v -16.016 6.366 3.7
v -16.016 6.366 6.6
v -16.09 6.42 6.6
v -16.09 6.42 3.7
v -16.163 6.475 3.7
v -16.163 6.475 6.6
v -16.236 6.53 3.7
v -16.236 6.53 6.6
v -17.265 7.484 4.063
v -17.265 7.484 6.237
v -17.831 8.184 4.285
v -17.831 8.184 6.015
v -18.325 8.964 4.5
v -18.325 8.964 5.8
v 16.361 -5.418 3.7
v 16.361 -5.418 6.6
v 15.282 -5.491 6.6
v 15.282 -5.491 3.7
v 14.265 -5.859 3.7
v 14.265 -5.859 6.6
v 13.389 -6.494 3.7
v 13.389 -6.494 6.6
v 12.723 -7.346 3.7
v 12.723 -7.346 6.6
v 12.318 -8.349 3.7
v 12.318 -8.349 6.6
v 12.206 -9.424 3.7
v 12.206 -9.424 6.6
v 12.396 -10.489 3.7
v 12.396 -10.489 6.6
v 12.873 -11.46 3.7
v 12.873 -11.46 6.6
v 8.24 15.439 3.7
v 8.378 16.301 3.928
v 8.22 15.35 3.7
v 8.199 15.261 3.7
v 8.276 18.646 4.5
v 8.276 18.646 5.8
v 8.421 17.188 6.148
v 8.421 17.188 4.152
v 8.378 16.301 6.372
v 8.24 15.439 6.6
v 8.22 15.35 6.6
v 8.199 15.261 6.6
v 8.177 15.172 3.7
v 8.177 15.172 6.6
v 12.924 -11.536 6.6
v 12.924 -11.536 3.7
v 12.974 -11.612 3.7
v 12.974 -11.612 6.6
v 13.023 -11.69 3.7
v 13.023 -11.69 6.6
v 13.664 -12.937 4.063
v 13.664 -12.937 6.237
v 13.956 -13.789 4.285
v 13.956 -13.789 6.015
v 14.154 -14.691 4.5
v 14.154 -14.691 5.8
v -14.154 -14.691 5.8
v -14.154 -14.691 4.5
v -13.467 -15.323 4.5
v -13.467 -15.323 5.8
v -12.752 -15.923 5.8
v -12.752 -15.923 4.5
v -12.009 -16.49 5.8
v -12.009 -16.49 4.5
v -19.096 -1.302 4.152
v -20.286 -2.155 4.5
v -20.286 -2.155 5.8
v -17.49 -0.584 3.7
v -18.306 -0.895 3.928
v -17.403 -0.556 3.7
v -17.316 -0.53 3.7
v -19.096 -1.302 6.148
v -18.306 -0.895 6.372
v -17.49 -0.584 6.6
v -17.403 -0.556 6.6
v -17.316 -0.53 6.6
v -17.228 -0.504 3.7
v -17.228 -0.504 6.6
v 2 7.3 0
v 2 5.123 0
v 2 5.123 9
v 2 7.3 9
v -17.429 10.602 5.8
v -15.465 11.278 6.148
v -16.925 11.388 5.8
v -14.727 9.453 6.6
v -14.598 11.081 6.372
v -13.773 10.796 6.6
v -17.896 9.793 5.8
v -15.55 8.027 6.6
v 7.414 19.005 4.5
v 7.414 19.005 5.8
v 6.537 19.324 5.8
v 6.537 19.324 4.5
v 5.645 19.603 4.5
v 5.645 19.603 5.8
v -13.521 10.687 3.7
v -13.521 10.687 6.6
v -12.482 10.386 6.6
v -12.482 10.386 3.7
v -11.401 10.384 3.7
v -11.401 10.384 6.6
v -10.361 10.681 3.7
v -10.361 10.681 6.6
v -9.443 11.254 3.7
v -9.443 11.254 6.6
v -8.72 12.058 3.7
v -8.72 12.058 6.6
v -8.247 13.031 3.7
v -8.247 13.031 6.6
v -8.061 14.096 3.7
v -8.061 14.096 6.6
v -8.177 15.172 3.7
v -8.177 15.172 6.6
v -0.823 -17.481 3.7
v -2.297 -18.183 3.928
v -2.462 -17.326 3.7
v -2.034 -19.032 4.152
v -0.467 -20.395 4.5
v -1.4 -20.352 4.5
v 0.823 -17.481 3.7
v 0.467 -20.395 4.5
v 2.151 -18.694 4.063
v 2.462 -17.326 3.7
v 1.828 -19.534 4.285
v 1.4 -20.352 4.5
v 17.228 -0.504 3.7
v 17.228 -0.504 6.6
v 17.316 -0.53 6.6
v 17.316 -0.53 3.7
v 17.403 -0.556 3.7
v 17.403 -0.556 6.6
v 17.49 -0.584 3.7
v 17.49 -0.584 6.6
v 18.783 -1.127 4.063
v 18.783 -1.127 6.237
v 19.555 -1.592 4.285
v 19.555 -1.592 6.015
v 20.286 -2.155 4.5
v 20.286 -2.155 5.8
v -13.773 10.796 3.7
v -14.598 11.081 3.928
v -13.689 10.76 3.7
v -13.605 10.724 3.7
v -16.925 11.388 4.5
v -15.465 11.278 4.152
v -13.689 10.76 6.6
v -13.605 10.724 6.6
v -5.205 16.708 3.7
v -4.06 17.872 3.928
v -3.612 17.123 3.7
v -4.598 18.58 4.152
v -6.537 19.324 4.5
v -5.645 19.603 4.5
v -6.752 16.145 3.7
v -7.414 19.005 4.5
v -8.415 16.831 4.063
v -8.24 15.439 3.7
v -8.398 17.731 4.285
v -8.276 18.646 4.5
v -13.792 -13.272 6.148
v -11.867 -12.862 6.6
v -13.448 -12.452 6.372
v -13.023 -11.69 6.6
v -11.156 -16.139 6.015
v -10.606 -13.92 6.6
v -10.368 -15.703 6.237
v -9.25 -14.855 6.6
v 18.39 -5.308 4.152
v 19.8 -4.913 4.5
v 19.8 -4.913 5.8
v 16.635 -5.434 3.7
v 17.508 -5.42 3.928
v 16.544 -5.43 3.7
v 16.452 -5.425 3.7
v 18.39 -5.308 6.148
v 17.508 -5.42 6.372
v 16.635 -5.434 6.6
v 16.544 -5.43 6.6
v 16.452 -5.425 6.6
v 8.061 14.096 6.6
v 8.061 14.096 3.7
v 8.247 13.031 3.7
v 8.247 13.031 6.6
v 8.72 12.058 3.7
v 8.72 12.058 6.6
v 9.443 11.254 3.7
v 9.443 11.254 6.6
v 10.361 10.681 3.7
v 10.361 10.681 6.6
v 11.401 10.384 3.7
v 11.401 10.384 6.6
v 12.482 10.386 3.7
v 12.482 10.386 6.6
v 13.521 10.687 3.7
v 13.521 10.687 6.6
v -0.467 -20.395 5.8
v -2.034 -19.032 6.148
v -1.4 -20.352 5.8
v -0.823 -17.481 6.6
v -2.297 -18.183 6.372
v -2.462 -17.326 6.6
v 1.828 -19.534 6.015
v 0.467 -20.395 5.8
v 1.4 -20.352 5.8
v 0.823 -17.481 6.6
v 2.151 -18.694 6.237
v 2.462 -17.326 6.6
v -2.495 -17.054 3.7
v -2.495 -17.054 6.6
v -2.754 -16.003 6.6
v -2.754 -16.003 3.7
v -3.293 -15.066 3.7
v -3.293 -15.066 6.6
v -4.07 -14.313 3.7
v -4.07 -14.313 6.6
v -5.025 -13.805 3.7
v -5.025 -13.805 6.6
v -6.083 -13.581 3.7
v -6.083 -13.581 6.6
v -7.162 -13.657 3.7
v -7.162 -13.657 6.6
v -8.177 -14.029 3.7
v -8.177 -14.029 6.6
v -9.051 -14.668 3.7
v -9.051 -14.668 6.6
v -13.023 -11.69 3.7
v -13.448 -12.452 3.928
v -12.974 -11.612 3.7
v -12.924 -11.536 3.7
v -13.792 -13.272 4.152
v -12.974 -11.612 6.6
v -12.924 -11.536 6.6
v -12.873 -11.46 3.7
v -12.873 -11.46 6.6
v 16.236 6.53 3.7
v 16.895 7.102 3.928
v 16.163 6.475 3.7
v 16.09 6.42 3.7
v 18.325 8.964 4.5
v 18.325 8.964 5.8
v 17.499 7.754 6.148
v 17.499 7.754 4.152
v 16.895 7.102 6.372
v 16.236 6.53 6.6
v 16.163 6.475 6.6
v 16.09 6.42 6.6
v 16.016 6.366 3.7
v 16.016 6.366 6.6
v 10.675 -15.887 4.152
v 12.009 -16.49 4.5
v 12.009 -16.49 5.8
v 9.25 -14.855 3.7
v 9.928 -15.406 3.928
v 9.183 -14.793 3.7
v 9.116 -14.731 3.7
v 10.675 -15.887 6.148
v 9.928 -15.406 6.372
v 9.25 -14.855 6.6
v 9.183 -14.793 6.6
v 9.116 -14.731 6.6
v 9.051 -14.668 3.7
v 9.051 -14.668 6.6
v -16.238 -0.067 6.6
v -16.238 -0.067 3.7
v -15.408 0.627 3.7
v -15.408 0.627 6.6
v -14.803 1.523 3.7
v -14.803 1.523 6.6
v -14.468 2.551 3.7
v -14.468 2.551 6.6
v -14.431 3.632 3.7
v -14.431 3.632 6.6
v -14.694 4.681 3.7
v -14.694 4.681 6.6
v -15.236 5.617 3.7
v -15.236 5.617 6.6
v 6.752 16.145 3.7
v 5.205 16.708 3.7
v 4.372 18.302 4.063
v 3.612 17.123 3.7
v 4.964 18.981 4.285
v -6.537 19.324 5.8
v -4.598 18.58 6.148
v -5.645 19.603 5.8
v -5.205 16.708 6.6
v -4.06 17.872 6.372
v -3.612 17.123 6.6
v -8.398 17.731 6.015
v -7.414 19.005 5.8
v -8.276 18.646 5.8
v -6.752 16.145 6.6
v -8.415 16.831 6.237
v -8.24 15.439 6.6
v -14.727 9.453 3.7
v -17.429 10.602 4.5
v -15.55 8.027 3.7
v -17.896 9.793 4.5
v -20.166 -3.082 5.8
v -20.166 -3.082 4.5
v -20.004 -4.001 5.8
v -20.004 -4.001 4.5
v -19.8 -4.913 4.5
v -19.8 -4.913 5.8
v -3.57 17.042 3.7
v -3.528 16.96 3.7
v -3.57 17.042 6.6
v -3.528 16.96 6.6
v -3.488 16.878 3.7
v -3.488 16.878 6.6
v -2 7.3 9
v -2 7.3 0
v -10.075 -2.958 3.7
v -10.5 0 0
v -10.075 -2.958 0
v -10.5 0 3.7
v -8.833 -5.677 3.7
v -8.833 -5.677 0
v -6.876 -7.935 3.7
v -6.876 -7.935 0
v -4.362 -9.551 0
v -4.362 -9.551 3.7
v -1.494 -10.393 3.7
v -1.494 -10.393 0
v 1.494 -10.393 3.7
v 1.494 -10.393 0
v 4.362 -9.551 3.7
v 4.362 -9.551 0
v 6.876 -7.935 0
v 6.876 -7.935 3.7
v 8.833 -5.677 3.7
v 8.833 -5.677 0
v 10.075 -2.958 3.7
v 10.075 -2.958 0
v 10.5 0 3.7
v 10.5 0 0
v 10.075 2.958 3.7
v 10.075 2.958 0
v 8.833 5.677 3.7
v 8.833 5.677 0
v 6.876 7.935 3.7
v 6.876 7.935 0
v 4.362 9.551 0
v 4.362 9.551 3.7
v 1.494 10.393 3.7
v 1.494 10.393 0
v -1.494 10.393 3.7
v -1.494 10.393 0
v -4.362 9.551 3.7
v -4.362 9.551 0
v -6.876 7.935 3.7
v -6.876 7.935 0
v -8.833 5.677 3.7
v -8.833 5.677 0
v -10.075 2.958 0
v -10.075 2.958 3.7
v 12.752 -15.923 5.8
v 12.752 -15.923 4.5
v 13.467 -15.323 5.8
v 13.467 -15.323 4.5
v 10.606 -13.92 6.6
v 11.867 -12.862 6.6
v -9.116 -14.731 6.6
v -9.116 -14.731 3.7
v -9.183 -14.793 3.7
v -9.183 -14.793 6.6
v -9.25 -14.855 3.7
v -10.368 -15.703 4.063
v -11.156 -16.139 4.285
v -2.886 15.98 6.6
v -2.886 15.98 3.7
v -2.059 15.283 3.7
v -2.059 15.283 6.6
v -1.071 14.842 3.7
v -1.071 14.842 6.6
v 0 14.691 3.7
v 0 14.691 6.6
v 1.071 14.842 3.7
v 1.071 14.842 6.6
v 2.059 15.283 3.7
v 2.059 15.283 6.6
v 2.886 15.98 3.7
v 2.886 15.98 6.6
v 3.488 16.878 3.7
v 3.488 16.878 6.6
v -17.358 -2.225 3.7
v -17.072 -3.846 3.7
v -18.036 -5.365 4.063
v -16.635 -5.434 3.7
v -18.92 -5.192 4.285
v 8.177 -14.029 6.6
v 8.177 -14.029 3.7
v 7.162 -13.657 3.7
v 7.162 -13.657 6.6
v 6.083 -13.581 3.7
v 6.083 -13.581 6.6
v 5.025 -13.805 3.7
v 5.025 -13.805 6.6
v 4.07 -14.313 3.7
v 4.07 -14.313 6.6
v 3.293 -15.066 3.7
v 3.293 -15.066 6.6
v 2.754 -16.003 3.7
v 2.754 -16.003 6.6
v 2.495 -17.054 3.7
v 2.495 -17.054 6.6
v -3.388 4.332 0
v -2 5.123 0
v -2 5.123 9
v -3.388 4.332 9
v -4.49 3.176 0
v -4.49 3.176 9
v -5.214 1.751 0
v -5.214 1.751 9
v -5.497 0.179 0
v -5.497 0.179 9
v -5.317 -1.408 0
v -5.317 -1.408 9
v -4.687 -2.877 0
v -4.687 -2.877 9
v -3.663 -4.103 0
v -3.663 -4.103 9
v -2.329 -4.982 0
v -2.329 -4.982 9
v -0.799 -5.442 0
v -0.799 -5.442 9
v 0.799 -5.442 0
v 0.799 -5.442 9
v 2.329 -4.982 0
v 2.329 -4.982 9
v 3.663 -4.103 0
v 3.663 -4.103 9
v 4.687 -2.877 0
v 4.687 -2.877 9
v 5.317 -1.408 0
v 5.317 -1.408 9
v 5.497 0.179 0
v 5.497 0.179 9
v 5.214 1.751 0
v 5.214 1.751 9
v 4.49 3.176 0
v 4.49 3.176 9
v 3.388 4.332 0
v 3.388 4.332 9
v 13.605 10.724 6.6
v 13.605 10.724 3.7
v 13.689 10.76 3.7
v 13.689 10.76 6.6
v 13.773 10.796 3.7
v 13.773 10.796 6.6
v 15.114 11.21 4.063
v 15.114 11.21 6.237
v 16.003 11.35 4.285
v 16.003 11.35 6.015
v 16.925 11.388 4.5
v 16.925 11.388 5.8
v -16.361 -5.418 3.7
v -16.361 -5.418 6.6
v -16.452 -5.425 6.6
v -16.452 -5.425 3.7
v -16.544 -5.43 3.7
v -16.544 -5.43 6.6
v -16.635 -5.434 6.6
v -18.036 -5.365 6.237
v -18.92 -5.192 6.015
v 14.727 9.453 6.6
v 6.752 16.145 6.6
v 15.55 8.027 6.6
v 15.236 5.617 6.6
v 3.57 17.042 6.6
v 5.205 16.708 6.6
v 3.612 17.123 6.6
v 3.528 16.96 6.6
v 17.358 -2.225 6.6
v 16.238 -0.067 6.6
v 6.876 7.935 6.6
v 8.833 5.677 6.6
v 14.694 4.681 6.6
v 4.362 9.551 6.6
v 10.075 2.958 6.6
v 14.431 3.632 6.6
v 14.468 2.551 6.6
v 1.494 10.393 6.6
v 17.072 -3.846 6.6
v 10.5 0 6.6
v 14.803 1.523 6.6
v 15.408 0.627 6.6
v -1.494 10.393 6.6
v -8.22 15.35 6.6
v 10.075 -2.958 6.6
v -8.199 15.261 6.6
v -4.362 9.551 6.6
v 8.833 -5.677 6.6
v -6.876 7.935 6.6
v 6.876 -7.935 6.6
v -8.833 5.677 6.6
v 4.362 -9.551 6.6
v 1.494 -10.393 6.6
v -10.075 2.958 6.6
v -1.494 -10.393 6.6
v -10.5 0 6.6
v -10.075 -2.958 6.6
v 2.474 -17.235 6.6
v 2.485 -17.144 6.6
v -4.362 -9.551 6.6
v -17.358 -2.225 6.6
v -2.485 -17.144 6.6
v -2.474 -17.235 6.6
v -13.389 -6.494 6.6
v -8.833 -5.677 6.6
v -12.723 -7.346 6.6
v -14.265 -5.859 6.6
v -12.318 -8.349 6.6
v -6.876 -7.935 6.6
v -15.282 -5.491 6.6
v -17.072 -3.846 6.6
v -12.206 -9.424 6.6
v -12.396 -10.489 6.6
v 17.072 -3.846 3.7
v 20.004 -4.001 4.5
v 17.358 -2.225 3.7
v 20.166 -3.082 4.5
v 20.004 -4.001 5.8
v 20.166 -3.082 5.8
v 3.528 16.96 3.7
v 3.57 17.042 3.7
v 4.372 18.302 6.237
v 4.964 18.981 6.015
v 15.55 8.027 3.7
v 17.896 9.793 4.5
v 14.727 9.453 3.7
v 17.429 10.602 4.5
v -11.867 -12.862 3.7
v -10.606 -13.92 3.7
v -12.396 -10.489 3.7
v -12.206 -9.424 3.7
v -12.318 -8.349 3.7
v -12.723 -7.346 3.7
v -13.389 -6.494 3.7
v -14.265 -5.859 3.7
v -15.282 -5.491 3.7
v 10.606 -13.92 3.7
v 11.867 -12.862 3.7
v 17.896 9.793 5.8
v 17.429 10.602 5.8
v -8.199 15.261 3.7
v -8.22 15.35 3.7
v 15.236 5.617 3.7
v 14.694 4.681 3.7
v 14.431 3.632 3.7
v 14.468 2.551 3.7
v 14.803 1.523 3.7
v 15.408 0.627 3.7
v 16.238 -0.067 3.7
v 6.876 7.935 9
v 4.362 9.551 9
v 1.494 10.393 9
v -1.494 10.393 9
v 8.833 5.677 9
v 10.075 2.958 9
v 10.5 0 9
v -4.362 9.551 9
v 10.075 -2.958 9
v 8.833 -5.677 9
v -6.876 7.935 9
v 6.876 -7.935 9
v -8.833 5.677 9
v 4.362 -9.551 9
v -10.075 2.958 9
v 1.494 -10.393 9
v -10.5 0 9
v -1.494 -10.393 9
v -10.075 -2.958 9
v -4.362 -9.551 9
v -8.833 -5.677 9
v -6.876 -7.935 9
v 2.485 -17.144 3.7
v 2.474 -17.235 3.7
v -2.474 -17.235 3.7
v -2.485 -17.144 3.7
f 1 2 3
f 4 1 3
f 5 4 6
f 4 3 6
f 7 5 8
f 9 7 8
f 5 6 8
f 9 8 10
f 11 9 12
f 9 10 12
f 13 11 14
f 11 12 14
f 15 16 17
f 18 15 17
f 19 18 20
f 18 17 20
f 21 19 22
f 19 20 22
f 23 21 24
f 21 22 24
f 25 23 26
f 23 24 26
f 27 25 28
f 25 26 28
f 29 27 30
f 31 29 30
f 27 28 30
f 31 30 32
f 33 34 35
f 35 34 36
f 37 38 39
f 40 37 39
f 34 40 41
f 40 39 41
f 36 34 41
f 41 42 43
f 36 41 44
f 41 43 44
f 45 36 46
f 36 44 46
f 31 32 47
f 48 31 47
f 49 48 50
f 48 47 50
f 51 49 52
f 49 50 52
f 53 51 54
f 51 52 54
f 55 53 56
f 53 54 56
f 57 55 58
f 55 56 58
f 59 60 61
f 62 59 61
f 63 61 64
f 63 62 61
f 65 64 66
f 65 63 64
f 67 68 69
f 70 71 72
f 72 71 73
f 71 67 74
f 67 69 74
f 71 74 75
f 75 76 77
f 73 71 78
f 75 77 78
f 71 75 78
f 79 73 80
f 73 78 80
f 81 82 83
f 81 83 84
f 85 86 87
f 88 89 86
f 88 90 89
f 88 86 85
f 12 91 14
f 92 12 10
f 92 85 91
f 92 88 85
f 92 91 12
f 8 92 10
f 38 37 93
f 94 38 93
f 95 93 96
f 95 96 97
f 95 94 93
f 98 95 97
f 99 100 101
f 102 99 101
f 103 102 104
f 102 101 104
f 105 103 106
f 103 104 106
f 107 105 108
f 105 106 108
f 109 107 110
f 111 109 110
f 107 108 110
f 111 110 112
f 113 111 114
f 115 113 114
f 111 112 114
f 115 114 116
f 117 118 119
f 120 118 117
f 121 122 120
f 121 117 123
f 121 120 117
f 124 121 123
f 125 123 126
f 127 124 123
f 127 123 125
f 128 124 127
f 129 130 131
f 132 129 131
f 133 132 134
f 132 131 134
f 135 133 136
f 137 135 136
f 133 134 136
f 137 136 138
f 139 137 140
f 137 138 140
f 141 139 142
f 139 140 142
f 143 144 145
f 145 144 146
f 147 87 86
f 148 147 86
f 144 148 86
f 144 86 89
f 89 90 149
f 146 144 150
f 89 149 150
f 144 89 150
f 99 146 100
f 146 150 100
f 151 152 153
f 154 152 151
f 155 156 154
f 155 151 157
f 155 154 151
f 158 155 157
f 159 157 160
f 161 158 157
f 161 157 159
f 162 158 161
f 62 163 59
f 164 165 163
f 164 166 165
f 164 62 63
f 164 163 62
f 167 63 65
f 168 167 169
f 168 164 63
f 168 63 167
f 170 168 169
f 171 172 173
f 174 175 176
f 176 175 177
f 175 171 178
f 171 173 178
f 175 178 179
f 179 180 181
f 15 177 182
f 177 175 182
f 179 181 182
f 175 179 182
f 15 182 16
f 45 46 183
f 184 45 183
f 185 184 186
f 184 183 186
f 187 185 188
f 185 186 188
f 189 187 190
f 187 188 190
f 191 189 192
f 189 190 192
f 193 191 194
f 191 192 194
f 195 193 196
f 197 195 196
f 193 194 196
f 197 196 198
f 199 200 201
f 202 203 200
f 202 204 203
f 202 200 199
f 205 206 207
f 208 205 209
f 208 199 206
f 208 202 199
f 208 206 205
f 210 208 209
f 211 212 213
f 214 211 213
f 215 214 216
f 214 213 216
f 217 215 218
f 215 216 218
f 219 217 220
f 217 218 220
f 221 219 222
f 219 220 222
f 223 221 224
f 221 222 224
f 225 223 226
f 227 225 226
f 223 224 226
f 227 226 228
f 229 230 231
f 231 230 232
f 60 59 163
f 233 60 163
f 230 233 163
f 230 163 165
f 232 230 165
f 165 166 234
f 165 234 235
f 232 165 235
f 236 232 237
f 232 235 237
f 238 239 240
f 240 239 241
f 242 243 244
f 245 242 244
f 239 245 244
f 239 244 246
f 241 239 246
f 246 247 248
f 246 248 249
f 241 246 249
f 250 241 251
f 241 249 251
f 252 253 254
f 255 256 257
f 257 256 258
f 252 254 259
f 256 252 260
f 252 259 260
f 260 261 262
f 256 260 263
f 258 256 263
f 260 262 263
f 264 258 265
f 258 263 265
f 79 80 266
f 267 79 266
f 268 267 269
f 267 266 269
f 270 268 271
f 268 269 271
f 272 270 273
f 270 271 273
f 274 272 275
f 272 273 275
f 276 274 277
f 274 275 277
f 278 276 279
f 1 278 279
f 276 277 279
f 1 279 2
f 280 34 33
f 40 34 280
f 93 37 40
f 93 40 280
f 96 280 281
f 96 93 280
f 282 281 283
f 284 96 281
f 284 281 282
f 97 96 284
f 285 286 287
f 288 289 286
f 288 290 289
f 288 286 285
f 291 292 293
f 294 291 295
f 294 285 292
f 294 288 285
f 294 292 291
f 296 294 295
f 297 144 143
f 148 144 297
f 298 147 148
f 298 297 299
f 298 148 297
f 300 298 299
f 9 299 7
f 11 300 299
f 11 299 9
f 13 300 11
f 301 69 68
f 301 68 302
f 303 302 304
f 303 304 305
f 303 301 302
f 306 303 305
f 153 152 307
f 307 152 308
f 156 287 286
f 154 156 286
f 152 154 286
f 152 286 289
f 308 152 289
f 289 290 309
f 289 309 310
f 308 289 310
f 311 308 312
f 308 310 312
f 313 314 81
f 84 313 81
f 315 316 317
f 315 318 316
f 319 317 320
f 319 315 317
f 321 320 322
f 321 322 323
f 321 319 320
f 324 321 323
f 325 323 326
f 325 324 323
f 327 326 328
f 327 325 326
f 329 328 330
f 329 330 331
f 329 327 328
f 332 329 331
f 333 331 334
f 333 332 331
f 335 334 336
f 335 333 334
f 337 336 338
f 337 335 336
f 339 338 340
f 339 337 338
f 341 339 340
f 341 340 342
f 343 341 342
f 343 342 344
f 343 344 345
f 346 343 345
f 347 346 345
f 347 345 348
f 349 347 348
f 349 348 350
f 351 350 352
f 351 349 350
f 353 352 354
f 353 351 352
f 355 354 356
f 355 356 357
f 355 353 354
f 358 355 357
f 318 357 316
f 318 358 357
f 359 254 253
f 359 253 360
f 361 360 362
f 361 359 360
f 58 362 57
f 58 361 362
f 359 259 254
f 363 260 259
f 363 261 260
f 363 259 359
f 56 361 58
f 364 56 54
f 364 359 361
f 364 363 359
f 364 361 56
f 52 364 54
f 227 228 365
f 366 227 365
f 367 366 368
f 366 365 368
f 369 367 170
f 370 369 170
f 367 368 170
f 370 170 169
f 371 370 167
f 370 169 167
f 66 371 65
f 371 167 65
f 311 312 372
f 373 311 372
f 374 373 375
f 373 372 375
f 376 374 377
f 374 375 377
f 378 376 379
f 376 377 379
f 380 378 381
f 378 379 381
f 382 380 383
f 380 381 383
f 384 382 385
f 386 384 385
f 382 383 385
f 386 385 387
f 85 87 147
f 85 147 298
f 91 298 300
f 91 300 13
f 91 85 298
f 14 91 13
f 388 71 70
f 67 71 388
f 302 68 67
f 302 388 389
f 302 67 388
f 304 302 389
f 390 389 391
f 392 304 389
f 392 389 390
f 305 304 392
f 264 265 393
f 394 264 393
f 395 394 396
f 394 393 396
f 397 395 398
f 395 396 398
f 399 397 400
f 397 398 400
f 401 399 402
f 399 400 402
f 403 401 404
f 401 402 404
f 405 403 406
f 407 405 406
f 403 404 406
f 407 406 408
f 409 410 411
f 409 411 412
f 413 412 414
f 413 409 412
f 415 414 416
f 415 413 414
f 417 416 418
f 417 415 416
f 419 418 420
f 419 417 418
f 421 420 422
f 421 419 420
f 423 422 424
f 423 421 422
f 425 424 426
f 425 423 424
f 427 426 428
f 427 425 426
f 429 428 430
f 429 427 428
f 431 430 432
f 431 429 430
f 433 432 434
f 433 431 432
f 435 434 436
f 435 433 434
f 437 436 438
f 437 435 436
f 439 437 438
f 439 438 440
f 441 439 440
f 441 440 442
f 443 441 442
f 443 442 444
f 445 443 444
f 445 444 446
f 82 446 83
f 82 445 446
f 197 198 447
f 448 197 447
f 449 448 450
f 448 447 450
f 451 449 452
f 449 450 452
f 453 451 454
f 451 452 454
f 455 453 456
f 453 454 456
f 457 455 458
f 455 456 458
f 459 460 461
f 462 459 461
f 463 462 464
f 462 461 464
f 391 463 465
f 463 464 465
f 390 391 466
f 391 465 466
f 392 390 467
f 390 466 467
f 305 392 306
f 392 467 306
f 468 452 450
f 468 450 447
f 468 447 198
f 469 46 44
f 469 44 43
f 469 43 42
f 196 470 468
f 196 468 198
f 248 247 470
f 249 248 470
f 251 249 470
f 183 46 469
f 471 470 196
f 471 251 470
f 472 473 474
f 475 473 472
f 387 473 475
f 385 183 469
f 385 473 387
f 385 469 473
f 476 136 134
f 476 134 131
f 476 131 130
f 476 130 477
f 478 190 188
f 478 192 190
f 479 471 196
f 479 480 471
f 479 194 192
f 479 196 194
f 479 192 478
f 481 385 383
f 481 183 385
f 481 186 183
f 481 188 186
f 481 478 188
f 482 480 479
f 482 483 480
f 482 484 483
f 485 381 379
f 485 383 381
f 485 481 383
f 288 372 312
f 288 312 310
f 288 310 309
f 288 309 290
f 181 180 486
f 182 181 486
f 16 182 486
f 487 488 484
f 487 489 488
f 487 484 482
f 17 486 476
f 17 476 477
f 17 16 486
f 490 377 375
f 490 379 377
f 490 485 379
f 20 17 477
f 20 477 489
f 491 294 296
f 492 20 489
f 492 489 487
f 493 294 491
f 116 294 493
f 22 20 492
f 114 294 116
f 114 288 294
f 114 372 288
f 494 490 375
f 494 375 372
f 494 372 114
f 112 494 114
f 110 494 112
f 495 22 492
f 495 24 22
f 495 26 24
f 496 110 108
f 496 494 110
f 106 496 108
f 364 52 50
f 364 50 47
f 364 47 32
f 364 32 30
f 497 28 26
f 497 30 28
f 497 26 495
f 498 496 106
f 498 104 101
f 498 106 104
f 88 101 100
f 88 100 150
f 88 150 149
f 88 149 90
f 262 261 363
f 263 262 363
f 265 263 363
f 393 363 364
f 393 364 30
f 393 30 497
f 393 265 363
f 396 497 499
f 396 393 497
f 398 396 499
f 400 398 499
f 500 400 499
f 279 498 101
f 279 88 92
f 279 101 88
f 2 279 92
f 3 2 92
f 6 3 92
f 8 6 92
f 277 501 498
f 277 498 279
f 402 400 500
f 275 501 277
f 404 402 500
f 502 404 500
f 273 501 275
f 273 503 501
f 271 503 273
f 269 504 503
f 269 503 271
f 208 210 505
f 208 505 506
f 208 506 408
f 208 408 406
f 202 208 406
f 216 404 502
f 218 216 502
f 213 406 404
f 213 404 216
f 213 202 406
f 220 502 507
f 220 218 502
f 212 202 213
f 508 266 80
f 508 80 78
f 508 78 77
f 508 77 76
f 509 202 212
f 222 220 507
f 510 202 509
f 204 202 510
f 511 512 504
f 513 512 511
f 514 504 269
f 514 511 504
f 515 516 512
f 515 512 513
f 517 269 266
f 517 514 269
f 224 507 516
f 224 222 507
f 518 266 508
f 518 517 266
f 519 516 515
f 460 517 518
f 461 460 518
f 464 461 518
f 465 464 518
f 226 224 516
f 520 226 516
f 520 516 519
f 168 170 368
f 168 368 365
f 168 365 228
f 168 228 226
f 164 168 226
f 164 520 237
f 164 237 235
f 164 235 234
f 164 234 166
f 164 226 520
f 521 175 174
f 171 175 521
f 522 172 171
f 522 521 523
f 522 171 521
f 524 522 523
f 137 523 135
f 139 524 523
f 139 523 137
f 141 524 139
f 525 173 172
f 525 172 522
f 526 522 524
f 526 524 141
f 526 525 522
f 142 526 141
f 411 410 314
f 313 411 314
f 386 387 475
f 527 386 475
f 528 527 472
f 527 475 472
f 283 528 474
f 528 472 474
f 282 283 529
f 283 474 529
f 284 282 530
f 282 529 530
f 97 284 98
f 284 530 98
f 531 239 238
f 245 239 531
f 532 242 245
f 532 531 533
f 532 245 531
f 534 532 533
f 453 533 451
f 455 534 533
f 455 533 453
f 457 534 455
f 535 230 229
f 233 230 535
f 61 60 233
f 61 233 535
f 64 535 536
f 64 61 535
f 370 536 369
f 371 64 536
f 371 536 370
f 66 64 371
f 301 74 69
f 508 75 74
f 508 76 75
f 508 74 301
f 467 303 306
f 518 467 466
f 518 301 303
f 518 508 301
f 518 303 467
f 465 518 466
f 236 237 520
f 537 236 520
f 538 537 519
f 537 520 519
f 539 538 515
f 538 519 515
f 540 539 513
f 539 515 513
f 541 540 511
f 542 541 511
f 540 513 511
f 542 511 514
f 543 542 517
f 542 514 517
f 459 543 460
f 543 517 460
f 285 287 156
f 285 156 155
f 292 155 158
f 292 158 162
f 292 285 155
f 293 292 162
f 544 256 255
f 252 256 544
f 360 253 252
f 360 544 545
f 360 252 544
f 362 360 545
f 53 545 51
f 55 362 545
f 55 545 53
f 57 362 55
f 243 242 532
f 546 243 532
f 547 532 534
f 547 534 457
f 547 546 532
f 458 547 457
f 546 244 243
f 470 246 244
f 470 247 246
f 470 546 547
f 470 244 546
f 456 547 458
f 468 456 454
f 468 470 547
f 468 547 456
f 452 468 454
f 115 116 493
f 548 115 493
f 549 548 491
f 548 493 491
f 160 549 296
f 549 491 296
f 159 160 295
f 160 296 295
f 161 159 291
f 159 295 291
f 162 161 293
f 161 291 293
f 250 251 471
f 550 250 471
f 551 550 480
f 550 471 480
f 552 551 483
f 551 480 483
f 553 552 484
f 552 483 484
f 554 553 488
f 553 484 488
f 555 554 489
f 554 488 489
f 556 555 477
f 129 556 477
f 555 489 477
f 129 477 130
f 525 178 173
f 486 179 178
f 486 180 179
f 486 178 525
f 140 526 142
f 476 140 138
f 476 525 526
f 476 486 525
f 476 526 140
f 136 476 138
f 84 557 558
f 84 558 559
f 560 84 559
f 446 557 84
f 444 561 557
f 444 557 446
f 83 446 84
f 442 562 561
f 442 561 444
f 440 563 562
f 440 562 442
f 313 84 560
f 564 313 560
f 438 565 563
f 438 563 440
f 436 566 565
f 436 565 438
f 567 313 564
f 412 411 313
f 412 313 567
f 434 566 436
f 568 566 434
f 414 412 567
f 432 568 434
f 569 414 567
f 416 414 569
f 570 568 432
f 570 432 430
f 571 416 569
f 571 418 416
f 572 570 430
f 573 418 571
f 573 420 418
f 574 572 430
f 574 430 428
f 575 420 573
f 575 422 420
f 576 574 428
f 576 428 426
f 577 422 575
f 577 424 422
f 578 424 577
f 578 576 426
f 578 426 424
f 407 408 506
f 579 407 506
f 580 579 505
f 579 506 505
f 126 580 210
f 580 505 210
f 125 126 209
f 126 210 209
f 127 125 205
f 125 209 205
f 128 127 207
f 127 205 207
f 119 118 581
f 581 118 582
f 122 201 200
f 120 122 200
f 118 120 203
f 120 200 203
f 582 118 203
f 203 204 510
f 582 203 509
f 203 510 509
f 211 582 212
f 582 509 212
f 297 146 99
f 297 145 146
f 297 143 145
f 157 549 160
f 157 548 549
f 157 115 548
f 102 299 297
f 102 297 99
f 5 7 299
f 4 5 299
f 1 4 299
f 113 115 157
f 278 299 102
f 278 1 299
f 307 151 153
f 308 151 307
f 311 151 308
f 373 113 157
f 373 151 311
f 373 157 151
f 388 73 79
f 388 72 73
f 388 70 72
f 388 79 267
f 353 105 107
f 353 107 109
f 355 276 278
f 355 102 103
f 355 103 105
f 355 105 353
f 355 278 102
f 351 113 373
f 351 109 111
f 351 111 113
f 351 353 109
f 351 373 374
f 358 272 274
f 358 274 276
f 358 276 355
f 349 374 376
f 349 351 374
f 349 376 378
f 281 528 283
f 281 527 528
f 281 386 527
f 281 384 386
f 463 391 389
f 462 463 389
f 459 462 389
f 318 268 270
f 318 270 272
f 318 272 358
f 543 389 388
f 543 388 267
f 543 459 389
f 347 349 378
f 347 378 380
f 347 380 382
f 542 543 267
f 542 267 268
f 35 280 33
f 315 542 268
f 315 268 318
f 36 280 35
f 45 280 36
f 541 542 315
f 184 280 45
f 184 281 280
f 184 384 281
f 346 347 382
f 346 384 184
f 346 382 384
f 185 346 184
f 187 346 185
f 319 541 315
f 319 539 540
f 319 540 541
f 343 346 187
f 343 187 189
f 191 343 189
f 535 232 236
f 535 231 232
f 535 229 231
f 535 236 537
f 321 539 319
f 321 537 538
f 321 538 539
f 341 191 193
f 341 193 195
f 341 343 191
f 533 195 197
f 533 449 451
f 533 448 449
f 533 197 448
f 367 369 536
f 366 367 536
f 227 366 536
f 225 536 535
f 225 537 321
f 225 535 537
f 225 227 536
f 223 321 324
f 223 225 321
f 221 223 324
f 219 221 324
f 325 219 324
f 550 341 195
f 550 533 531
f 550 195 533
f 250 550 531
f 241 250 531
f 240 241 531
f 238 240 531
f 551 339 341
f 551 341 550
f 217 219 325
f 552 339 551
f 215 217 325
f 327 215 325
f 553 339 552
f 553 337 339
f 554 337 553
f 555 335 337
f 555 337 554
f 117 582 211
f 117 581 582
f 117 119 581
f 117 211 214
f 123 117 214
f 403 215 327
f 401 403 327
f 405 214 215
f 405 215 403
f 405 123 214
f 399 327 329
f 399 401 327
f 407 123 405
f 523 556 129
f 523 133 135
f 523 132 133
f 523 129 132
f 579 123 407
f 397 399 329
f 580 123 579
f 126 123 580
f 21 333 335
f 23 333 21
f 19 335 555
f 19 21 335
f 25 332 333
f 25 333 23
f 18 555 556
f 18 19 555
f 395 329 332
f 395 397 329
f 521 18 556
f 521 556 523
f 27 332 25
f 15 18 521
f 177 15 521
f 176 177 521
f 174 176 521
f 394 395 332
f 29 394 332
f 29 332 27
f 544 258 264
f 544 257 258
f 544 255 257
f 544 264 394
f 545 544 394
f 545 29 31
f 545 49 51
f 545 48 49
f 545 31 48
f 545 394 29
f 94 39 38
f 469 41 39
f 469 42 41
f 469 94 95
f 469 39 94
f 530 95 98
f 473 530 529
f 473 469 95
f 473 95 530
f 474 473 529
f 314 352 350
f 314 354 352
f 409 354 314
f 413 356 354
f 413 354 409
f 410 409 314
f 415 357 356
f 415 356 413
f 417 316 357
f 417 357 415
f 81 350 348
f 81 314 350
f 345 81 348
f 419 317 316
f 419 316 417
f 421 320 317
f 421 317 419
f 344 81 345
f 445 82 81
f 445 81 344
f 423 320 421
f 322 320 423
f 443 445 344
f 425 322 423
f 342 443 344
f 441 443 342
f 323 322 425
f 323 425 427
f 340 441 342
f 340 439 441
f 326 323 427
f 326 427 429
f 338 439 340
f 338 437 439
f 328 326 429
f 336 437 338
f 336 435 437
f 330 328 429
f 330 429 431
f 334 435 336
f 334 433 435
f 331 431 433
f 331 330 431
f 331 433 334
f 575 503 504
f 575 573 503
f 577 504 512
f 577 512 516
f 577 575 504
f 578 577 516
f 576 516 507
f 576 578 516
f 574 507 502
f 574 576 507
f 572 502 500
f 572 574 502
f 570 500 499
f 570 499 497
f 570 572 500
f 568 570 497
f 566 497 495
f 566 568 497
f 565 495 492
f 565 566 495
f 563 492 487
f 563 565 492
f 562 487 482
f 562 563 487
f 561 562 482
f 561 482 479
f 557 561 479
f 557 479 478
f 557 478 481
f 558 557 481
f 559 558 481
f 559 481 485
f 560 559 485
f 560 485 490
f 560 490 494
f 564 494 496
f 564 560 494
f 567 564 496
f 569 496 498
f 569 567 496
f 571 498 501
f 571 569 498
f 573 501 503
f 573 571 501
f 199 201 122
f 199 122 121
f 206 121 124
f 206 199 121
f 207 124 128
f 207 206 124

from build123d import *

# Parameters (mm, degrees)
ESQUISSE2_W                  = 4
ESQUISSE2_H                  = 7.3
ENL_V_MAT_EXTRU_1_DEPTH      = 31.221184623
ENL_V_MAT_EXTRU_2_DEPTH      = 30.306014741
R_P_TITION_CIRCULAIRE1_COUNT = 9


with BuildPart() as part:
    # Esquisse1 → Révolution1 (revolve)
    with BuildSketch(Plane(origin=(0, 0, 0), x_dir=(0, 0, -1), z_dir=(1, 0, 0))):
        Polygon((-5.8, 20.4), (-6.6, 17.5), (-6.6, 10.5), (-9, 10.5), (-9, 5.5), (0, 5.5), (0, 10.5), (-3.7, 10.5), (-3.7, 17.5), (-4.5, 20.4), align=None)
    revolve(axis=Axis((0, 0, 0), (0, 0, 1)))

    # Esquisse2 → Enlèv. mat.-Extru.1 (cut, through all)
    with BuildSketch(Plane.XY):
        with Locations((0, 3.65)):
            Rectangle(ESQUISSE2_W, ESQUISSE2_H)
    extrude(amount=ENL_V_MAT_EXTRU_1_DEPTH, mode=Mode.SUBTRACT)

    # Esquisse4 → Enlèv. mat.-Extru.2 (cut, symmetric)
    with BuildSketch(Plane.XY.offset(5.15)):
        with BuildLine():
            ThreePointArc((-3.488153141, 16.878433832), (0, 14.691157941), (3.488153141, 16.878433832))
            ThreePointArc((3.488153141, 16.878433832), (4.416914632, 18.359445416), (5.645191484, 19.603362291))
            ThreePointArc((5.645191484, 19.603362291), (0, 20.4), (-5.645191484, 19.603362291))
            ThreePointArc((-5.645191484, 19.603362291), (-4.416914632, 18.359445416), (-3.488153141, 16.878433832))
        make_face()
    enl_v_mat_extru_2 = extrude(amount=ENL_V_MAT_EXTRU_2_DEPTH, both=True, mode=Mode.SUBTRACT)

    # Répétition circulaire1: Enlèv. mat.-Extru.2 ×9 about axis
    r_p_tition_circulaire1_axis = Axis((0, 0, 0), (0, 0, 1))
    for i in range(1, R_P_TITION_CIRCULAIRE1_COUNT):
        add(enl_v_mat_extru_2.rotate(r_p_tition_circulaire1_axis, i * 360 / R_P_TITION_CIRCULAIRE1_COUNT), mode=Mode.SUBTRACT)


solid = part.part
